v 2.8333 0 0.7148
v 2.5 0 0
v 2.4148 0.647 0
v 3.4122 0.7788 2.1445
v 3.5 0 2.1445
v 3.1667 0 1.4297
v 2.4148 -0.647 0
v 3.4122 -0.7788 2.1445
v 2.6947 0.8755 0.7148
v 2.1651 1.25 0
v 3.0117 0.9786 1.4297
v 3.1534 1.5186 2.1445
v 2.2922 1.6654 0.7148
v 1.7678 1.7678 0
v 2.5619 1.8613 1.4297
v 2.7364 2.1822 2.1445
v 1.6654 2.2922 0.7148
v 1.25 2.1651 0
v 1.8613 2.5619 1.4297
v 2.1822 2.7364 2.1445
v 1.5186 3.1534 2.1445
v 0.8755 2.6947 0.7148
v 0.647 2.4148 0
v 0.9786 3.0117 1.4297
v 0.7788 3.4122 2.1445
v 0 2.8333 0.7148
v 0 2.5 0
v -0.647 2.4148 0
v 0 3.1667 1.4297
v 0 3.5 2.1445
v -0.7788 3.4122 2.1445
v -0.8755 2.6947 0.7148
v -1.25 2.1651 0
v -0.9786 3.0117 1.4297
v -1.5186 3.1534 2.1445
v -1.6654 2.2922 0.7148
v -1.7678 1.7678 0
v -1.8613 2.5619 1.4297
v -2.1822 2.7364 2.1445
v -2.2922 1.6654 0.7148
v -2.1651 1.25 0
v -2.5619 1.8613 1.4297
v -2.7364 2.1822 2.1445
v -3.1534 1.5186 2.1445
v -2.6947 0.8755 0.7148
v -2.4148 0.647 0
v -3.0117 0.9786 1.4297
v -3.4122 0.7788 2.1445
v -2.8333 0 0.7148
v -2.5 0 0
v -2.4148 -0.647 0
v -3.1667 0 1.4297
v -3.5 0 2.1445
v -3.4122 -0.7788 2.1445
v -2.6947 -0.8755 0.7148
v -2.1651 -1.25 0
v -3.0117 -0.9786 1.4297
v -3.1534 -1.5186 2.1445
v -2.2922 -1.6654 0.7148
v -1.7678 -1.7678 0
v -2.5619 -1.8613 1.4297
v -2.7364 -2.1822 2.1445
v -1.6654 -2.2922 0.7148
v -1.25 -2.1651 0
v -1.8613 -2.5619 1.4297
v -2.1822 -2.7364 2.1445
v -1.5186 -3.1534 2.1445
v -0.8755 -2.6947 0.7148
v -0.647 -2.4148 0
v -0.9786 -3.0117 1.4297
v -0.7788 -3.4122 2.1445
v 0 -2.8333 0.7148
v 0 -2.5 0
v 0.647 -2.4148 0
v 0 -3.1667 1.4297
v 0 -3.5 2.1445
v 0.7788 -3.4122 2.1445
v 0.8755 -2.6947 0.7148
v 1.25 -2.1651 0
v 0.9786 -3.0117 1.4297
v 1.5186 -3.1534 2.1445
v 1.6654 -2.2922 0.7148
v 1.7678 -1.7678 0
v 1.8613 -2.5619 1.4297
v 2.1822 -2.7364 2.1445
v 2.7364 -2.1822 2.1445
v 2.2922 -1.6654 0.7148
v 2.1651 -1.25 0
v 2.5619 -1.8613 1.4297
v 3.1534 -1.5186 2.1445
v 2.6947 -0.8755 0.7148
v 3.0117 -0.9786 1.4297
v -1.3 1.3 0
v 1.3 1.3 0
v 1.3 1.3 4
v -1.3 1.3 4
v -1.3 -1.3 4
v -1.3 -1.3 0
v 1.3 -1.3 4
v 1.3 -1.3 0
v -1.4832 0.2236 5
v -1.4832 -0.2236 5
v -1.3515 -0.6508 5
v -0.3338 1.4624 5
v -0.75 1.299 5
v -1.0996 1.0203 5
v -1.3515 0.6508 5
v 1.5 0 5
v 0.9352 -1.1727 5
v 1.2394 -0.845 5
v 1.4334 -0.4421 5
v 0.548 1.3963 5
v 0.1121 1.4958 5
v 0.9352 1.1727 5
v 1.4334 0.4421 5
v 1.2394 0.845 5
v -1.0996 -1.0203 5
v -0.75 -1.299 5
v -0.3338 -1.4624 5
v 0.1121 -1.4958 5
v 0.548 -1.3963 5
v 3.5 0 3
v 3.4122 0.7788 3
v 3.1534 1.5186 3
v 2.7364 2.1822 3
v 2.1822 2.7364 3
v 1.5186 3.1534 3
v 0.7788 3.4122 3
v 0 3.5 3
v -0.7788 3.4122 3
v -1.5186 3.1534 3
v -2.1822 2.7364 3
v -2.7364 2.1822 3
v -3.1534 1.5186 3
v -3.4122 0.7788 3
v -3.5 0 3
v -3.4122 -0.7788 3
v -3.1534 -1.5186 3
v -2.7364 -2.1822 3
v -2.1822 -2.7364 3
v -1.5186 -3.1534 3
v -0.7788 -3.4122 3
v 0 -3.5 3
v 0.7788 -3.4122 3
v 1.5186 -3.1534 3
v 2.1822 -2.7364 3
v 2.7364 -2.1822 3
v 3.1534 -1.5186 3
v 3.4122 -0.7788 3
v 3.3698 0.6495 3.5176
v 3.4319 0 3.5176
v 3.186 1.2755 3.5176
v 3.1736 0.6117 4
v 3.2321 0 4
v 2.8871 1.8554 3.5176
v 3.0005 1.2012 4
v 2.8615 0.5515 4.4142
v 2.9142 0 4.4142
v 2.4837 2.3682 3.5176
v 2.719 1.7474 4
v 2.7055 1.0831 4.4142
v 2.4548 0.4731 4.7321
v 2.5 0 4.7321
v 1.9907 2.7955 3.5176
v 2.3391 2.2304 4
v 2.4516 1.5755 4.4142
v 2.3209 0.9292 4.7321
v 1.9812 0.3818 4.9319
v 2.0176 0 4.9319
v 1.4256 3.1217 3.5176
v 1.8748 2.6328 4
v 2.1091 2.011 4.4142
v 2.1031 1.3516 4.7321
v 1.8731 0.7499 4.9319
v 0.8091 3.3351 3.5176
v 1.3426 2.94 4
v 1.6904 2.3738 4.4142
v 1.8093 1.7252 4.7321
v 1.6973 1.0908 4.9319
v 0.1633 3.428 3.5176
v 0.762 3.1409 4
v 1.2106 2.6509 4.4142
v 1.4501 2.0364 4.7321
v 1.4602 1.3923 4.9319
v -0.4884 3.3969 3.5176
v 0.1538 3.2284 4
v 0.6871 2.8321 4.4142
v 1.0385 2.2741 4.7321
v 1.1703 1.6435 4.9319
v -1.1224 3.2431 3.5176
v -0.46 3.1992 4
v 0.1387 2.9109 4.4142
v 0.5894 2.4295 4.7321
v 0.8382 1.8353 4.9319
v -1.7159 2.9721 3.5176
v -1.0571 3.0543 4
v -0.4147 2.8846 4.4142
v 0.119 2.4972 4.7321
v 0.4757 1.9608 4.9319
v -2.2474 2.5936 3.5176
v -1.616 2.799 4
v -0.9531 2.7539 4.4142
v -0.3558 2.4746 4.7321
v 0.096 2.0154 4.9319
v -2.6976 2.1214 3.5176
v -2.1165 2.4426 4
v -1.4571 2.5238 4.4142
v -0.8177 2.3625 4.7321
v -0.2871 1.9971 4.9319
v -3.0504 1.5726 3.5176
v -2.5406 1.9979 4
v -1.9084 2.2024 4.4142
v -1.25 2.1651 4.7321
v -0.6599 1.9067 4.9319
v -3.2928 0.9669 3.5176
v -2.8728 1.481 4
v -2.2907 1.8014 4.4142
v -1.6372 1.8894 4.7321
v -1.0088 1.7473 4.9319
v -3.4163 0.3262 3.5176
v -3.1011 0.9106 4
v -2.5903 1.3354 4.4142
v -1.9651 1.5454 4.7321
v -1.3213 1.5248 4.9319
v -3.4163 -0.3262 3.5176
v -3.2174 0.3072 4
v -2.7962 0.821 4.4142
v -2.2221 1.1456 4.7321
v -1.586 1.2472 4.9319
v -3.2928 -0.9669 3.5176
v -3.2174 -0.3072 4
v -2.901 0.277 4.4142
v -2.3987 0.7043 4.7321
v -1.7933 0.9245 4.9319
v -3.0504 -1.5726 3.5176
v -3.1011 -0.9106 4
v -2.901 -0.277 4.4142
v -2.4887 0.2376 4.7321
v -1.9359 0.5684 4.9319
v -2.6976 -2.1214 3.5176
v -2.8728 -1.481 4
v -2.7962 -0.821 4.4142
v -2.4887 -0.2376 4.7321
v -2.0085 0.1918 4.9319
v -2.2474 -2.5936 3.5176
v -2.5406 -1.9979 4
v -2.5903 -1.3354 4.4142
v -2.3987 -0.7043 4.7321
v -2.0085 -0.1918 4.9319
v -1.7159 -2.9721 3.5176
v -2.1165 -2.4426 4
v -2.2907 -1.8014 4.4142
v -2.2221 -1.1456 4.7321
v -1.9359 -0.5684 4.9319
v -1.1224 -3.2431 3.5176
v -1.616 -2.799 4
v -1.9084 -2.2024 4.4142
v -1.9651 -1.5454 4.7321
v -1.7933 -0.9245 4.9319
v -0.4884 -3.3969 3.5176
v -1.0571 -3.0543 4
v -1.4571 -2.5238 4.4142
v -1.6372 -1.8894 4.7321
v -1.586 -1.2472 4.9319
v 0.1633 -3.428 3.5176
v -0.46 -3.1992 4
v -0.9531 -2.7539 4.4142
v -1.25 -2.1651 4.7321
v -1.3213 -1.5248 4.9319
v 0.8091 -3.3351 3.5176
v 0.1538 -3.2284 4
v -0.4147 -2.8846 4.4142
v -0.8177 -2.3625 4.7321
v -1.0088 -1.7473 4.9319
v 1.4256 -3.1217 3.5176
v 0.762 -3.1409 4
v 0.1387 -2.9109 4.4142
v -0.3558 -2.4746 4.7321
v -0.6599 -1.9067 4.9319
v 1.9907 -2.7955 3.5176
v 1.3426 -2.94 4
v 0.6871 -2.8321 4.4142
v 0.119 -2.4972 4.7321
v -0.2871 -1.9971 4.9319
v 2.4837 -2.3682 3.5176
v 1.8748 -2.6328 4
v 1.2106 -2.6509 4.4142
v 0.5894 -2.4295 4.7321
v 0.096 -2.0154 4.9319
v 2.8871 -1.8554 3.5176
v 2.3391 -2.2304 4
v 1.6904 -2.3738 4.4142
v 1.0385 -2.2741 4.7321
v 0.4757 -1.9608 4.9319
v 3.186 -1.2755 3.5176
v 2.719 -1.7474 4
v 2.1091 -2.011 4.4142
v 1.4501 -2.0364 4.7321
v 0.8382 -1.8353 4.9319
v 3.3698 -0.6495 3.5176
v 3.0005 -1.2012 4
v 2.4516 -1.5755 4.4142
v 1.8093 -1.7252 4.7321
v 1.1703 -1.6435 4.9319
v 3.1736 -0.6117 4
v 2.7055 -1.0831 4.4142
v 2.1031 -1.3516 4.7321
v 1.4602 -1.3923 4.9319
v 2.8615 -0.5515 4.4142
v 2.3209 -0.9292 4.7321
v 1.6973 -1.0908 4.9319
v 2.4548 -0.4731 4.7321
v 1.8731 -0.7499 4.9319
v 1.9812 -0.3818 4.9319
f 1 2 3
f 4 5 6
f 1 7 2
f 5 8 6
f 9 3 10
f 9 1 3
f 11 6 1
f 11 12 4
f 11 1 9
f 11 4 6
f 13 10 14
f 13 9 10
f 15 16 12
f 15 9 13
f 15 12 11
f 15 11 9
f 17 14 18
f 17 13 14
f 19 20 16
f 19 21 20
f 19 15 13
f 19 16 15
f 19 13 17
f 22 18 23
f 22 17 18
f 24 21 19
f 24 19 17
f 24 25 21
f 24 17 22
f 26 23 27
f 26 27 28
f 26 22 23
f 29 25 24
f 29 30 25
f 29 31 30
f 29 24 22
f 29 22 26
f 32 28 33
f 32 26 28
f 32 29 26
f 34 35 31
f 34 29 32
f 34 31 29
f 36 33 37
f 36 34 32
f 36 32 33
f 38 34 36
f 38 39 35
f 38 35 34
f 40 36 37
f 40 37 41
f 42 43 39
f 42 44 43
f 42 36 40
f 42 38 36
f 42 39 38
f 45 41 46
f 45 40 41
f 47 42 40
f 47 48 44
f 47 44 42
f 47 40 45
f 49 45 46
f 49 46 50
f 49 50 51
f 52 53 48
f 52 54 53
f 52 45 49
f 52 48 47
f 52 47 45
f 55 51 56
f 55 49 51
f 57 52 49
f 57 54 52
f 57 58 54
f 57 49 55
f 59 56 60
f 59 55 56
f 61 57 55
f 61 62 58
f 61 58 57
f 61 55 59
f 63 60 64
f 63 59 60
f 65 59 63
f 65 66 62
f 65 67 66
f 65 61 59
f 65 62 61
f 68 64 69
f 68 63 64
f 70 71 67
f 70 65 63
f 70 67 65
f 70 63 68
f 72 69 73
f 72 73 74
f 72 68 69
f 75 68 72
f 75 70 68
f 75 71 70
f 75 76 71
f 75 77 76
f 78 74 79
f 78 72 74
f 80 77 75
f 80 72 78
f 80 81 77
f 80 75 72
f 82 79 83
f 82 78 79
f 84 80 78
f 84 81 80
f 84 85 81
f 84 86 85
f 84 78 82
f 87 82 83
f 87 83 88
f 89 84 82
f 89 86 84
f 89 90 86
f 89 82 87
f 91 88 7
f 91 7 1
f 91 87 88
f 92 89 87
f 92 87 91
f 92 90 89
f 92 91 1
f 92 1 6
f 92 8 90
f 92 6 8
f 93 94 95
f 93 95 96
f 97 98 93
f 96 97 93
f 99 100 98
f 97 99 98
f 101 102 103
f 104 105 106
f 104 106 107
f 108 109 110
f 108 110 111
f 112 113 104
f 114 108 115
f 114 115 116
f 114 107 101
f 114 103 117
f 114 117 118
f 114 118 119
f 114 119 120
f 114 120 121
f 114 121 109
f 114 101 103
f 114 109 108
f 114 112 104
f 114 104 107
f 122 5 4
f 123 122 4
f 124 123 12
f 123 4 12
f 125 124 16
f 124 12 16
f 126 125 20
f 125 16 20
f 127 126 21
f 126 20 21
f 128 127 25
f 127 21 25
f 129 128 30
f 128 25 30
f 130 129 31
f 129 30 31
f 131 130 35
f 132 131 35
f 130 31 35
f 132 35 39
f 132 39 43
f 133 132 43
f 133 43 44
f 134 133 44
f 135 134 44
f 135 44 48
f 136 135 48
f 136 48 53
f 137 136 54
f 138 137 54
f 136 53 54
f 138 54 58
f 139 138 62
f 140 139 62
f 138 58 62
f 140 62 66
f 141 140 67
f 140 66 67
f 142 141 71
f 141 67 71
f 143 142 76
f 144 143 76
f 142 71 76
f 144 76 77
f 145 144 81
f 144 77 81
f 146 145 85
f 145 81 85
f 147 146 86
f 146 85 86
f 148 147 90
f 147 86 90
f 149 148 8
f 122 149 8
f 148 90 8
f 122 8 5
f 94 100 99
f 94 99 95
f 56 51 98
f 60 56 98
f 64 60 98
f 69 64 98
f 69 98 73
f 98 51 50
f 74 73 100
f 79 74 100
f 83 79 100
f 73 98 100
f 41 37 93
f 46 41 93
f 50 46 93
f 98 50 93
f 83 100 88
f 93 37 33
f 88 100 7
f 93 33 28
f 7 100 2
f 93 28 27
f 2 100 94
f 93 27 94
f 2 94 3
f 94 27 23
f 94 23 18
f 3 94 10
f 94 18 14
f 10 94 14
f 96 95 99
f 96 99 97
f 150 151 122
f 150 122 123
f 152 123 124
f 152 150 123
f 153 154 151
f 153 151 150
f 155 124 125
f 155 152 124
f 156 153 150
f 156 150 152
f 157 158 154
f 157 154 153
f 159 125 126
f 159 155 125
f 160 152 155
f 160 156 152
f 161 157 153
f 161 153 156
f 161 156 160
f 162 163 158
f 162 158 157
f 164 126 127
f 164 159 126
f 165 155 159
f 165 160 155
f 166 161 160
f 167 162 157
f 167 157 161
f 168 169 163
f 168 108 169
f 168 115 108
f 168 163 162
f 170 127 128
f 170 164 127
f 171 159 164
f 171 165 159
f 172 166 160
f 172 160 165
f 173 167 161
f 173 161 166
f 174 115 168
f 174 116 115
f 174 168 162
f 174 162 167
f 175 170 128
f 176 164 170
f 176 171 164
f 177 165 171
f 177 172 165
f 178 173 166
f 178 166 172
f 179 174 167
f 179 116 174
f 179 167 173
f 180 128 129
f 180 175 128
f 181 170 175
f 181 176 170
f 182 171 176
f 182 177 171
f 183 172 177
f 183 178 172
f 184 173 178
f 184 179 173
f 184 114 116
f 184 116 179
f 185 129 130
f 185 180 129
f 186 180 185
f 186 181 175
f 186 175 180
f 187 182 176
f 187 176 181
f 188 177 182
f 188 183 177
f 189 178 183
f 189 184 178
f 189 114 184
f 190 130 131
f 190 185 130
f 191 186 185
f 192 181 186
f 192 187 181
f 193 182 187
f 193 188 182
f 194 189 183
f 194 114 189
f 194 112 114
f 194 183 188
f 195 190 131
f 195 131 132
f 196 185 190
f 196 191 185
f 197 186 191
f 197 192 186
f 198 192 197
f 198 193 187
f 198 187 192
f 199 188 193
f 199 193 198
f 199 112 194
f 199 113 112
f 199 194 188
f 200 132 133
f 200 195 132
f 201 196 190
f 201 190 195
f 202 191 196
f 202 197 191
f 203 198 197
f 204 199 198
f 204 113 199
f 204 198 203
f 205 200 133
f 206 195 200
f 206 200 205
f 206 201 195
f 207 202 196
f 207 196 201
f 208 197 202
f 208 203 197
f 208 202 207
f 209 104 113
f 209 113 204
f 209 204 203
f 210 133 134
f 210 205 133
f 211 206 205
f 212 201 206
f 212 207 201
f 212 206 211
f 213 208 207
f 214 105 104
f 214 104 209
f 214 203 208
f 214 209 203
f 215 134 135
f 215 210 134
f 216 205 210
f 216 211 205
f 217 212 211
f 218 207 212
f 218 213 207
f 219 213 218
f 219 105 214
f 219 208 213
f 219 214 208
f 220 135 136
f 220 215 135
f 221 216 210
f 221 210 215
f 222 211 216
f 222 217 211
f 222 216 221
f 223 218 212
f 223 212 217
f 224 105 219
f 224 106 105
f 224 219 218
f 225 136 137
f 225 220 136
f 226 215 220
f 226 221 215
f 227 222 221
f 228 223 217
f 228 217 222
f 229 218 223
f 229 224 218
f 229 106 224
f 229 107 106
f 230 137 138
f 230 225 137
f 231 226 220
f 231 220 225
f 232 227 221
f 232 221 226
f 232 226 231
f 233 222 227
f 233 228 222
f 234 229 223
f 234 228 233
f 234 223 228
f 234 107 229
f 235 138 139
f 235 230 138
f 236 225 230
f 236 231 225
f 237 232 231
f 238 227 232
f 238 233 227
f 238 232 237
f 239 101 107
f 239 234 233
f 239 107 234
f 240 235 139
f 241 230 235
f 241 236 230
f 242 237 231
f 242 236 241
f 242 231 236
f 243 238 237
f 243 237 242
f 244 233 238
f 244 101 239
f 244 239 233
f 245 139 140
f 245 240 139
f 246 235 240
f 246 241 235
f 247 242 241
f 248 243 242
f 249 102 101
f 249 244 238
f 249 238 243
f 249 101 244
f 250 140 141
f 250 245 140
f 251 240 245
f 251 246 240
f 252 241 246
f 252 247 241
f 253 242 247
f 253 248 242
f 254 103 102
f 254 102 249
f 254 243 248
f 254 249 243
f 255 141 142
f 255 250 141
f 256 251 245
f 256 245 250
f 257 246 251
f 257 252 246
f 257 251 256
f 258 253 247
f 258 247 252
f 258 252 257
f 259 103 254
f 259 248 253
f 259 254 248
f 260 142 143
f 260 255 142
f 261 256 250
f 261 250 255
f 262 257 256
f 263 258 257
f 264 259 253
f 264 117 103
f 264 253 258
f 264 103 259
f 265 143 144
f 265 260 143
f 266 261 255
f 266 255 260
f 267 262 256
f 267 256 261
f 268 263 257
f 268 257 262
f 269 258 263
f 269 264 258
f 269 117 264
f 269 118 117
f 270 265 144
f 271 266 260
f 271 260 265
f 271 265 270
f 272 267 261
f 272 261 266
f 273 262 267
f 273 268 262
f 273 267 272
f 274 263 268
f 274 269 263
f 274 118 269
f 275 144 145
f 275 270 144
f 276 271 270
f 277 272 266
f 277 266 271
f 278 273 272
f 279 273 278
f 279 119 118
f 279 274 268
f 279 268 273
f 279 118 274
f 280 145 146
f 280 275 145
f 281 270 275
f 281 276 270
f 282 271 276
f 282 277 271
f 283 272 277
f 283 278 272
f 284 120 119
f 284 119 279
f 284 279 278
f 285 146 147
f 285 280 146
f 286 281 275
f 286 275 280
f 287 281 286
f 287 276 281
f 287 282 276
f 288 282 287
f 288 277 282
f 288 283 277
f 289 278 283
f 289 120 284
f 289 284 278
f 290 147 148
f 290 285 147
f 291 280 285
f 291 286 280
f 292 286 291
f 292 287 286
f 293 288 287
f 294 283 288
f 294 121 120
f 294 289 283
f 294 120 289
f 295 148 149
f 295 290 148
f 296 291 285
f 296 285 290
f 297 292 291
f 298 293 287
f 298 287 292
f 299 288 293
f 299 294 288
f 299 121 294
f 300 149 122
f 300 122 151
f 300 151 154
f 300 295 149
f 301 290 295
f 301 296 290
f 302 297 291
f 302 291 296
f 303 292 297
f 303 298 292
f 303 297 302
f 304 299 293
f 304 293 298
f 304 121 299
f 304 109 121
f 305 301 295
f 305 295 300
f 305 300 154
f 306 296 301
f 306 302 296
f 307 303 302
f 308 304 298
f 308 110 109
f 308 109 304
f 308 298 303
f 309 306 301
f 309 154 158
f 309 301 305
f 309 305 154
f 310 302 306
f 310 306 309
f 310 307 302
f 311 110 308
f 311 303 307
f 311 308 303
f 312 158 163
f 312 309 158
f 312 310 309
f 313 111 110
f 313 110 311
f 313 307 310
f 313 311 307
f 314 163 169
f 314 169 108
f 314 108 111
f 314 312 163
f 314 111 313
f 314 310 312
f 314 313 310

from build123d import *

# Parameters (mm, degrees)
SKETCH_1_R          = 3.5
EXTRUDE_1_DEPTH     = 5
FILLET_1_R          = 2
SKETCH_2_W          = 2.6
SKETCH_2_H          = 2.6
CUT_EXTRUDE_1_DEPTH = 4
CHAMFER_1_SIZE      = 1
CHAMFER_1_SIZE2     = 2.144506921


with BuildPart() as part:
    # Эскиз1 → Бобышка-Вытянуть1 (new body)
    with BuildSketch(Plane.XY):
        Circle(SKETCH_1_R)
    extrude(amount=EXTRUDE_1_DEPTH)

    # Скругление1
    fillet_1_edges = [part.edges().sort_by_distance(p)[0] for p in [
        (-3.5, 0, 5),
    ]]
    fillet(fillet_1_edges, radius=FILLET_1_R)

    # Эскиз2 → Вырез-Вытянуть1 (cut)
    with BuildSketch(Plane(origin=(0, 0, 0), x_dir=(-1, 0, 0), z_dir=(0, 0, -1))):
        Rectangle(SKETCH_2_W, SKETCH_2_H)
    extrude(amount=-CUT_EXTRUDE_1_DEPTH, mode=Mode.SUBTRACT)

    # Фаска1
    chamfer_1_edges = [part.edges().sort_by_distance(p)[0] for p in [
        (-3.5, 0, 0),
    ]]
    chamfer_1_side = [part.faces().sort_by_distance(p)[0] for p in [
        (-3.401005051, 0, 0),
    ]]
    chamfer(chamfer_1_edges, length=CHAMFER_1_SIZE, length2=CHAMFER_1_SIZE2, reference=chamfer_1_side[0])


solid = part.part
